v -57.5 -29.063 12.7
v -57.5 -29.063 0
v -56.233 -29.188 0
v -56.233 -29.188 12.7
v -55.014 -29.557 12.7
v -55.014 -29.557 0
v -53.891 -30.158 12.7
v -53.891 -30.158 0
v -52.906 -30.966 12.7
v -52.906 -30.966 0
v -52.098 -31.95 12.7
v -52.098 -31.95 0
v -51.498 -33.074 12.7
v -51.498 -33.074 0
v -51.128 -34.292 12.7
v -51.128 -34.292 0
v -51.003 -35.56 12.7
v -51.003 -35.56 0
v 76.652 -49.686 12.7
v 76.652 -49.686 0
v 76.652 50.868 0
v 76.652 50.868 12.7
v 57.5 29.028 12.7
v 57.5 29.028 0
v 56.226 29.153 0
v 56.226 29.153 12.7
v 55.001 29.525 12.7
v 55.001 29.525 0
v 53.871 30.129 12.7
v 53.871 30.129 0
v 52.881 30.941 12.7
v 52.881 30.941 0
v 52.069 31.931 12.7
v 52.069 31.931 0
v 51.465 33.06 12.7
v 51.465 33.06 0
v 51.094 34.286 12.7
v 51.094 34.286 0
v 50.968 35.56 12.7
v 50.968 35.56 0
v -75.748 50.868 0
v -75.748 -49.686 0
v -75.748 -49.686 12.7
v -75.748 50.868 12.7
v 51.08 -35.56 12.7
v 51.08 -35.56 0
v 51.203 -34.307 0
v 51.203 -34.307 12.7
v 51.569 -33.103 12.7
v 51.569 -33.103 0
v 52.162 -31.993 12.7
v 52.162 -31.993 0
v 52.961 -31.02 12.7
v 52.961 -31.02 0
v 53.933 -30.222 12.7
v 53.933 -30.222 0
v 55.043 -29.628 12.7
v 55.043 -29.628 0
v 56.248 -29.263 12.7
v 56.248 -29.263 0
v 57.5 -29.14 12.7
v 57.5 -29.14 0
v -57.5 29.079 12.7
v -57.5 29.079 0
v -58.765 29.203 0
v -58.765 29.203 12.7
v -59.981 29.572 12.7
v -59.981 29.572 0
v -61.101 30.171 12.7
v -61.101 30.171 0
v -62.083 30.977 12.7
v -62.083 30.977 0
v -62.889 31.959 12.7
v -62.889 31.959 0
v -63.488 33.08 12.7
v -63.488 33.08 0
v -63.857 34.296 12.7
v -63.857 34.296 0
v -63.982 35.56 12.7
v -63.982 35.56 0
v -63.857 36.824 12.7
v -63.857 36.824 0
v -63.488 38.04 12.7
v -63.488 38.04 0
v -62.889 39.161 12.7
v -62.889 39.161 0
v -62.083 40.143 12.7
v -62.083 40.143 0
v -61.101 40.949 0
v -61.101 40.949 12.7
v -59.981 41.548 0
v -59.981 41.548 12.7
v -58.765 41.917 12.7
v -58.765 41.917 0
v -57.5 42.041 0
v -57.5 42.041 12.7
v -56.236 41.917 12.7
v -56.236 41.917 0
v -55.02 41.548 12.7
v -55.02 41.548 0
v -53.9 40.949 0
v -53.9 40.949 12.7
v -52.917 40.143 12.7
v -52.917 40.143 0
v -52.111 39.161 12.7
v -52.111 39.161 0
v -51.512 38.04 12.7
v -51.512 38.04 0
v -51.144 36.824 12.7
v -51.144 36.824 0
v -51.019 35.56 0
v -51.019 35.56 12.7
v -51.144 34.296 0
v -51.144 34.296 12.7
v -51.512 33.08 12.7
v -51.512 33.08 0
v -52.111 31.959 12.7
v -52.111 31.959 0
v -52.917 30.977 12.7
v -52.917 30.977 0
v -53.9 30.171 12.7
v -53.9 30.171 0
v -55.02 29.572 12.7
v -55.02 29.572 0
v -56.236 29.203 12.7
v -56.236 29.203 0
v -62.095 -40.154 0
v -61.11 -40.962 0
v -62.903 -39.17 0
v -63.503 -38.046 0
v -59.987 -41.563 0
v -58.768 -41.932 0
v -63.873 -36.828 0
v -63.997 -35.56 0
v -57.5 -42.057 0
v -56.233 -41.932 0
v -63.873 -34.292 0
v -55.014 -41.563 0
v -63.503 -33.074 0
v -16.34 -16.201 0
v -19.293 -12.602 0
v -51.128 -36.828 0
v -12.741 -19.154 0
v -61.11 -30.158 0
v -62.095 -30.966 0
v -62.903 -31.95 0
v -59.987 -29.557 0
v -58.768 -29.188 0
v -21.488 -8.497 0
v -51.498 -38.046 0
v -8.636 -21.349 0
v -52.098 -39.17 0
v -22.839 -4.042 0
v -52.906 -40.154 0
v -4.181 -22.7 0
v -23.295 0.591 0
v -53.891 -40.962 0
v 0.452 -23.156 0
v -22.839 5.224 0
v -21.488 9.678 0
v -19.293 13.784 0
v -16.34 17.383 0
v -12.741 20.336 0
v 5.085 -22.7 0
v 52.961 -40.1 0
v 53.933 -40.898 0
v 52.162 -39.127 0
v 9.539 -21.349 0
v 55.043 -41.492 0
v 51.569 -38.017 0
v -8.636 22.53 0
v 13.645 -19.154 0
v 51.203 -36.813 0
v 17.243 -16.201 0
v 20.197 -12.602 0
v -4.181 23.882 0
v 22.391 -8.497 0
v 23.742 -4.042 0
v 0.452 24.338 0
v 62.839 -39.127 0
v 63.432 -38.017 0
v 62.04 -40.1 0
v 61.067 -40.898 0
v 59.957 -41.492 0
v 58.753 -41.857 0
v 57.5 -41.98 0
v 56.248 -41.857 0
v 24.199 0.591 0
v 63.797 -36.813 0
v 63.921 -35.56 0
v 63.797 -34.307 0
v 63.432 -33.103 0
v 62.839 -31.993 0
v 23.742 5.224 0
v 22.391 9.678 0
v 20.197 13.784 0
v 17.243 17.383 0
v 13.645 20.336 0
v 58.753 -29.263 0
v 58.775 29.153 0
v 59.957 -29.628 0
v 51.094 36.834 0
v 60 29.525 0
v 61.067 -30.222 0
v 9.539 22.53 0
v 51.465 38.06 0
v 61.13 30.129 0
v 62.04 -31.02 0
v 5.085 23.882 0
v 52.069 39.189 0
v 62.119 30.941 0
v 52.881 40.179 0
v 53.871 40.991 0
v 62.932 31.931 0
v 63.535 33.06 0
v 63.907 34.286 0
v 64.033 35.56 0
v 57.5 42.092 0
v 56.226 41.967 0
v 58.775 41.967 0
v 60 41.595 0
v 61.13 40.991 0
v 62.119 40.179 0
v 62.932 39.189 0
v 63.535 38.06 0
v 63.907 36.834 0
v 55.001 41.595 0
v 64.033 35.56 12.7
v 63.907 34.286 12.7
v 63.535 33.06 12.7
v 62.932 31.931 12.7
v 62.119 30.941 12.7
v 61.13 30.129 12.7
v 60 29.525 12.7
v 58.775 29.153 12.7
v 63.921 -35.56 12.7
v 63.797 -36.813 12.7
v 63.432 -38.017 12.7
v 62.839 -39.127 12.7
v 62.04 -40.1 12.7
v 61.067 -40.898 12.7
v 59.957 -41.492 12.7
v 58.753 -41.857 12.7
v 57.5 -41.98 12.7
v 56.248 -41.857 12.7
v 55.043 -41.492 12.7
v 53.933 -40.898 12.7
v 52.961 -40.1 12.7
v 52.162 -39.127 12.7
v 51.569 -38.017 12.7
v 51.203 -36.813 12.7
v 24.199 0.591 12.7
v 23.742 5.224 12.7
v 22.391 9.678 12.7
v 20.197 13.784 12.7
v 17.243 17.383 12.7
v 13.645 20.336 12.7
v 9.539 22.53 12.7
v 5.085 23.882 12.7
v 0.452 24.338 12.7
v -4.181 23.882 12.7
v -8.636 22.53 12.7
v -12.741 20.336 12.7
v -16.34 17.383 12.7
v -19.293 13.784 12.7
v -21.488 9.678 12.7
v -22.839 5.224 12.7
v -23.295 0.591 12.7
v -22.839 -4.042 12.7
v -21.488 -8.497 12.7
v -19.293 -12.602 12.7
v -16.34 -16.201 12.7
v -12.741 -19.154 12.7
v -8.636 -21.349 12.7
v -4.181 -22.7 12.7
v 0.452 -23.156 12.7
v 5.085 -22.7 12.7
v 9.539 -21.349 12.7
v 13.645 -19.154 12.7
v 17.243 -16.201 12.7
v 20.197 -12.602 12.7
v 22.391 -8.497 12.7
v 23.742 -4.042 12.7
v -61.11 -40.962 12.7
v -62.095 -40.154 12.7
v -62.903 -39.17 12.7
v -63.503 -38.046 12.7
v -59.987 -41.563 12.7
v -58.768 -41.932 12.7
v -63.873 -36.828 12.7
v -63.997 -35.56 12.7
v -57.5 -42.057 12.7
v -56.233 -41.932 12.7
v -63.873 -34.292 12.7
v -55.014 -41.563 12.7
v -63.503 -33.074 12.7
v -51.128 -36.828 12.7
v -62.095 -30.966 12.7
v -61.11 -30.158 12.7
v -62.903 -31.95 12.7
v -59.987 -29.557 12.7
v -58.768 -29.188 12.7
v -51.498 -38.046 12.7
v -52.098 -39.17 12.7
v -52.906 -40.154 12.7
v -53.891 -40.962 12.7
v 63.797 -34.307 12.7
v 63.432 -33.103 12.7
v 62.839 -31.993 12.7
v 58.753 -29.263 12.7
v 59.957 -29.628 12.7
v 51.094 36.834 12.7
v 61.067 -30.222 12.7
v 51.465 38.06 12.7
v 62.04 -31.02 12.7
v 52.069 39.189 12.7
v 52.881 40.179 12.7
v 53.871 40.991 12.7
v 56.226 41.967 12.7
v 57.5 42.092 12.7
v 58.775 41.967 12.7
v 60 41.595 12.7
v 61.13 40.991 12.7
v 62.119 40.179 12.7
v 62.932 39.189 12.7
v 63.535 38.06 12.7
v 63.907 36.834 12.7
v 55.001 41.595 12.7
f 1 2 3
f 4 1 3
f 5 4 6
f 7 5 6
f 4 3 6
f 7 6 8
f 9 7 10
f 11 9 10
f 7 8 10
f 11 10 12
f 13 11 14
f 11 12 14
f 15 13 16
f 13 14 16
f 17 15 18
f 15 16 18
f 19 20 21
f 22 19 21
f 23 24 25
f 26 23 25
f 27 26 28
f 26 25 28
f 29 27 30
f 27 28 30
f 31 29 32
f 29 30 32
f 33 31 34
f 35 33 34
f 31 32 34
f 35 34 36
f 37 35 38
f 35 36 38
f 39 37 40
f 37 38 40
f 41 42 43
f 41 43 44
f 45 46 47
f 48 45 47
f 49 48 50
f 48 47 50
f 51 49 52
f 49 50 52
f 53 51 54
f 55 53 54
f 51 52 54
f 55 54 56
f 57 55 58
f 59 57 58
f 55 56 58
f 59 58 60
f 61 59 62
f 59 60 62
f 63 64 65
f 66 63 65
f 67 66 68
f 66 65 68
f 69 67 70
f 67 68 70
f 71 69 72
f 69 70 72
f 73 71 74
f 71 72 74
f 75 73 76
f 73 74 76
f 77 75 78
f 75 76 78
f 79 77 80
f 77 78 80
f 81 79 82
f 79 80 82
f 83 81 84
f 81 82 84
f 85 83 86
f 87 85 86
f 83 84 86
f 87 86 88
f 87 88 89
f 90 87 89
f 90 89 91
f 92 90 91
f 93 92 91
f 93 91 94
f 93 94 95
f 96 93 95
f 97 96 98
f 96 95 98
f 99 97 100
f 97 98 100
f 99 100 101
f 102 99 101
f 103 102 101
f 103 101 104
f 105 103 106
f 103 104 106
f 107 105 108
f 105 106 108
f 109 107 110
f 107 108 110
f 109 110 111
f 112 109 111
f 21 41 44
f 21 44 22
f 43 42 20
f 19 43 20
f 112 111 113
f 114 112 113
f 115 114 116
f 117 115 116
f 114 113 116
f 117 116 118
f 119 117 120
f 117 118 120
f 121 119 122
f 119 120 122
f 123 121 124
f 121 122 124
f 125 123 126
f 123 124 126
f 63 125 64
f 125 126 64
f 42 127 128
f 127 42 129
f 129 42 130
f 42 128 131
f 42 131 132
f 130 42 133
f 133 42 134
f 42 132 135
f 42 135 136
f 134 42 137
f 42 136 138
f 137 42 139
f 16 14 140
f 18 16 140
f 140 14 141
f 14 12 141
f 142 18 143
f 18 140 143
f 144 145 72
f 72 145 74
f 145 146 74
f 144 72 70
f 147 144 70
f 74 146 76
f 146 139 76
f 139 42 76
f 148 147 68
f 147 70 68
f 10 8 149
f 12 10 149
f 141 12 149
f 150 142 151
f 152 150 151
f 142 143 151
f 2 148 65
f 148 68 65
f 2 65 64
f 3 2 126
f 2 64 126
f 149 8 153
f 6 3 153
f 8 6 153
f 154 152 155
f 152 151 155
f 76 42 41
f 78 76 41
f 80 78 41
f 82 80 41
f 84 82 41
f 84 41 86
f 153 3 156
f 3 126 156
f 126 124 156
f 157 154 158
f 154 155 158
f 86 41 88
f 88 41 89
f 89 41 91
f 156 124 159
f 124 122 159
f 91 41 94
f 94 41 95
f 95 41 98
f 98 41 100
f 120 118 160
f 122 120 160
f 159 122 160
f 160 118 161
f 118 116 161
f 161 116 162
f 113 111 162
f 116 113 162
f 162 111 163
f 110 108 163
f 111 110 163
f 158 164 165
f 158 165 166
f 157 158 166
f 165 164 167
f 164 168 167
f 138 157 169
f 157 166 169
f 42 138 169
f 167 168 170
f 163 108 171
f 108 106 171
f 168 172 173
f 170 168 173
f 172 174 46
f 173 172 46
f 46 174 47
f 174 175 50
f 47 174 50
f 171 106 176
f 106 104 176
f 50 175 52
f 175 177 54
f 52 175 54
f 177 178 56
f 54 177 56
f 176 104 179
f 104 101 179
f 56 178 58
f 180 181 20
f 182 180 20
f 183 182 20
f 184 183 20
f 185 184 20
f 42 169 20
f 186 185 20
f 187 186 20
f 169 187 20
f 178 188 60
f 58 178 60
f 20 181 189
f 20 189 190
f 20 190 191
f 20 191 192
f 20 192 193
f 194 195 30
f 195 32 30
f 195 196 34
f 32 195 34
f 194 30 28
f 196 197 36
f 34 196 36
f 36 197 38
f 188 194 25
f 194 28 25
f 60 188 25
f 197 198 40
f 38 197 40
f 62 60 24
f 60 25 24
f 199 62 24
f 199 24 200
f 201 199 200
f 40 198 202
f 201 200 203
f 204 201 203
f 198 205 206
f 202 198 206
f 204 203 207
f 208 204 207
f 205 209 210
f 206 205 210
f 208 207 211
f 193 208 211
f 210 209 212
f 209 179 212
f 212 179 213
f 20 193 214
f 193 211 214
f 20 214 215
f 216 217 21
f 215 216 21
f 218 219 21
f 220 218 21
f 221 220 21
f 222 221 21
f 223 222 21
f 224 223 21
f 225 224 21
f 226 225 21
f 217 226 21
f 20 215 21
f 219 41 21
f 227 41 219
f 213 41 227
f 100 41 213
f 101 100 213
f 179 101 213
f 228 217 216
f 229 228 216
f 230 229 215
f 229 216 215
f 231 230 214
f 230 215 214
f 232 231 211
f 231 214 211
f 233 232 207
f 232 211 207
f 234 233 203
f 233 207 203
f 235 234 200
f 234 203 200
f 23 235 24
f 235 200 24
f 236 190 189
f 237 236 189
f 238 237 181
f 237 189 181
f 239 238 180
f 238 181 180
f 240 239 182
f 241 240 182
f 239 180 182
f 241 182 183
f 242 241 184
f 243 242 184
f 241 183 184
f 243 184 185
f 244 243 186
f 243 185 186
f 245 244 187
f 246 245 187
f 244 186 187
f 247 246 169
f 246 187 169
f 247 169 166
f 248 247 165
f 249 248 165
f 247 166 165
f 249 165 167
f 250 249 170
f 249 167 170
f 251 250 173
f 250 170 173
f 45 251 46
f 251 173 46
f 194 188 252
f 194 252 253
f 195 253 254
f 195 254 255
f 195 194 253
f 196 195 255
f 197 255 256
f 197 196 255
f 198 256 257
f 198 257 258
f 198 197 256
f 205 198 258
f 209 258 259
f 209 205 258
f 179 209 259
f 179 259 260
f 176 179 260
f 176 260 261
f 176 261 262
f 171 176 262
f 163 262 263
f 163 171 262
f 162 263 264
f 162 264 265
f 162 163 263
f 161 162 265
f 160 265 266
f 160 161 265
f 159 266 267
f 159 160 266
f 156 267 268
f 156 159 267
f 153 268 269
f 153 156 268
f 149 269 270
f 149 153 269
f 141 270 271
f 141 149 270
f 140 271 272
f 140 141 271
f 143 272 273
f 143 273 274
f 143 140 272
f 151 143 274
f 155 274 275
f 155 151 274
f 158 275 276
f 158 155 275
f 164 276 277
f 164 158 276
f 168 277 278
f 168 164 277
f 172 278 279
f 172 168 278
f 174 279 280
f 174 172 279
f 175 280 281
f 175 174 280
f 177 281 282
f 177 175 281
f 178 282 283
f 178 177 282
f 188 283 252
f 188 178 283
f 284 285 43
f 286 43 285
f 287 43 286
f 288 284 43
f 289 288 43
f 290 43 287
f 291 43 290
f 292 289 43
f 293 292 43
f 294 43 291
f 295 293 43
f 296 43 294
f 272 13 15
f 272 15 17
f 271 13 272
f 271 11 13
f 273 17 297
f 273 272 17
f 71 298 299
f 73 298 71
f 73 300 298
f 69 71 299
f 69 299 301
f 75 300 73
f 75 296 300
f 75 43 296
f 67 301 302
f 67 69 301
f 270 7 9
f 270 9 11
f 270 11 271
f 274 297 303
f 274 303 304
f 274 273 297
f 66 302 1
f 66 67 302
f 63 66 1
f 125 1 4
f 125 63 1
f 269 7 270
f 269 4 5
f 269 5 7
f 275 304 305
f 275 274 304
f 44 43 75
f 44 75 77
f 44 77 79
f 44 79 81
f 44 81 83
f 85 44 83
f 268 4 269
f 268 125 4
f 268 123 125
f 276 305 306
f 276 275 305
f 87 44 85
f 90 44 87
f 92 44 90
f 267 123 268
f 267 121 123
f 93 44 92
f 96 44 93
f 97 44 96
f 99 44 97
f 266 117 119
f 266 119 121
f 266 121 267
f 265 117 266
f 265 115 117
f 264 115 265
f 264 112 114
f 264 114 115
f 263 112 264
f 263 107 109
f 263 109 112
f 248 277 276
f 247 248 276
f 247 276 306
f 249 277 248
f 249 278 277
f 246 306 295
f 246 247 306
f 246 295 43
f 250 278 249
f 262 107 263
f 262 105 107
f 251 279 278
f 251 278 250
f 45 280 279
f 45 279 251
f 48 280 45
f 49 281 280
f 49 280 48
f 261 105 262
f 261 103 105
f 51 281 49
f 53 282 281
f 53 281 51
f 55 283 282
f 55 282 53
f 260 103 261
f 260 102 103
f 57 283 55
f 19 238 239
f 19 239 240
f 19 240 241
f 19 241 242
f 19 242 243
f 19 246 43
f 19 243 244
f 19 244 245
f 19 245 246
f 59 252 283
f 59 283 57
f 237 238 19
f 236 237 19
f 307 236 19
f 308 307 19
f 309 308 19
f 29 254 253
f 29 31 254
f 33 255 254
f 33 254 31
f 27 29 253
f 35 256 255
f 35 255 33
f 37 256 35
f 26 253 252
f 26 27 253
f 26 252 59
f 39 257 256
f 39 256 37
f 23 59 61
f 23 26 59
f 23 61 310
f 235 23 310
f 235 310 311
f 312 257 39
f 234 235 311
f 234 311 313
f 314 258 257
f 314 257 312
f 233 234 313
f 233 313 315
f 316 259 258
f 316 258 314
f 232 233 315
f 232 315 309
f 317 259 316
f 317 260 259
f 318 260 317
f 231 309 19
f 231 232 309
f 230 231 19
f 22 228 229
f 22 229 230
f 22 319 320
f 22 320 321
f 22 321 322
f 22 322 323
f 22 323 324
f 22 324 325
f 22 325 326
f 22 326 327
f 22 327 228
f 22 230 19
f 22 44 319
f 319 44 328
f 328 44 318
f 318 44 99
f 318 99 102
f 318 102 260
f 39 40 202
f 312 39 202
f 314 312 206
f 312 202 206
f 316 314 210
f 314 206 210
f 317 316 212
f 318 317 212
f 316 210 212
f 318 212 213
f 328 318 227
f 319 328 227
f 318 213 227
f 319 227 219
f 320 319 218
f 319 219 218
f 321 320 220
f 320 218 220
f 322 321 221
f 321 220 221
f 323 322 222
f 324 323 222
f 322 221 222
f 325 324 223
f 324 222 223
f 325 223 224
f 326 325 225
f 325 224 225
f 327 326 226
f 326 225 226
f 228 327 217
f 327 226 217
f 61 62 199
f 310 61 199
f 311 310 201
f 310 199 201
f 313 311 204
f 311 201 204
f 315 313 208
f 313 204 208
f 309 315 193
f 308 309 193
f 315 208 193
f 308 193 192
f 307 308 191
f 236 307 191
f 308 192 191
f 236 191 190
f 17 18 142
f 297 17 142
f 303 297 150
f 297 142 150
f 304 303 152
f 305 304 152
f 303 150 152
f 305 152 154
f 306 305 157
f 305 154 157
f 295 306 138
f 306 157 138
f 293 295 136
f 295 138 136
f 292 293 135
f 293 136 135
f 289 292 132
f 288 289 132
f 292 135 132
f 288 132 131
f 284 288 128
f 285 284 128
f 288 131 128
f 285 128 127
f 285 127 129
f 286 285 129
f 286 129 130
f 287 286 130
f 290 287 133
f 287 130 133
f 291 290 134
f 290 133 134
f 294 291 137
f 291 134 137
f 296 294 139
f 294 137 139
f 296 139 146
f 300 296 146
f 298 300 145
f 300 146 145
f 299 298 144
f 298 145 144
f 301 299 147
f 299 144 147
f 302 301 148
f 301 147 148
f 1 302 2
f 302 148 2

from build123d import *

# Parameters (mm, degrees)
F0_W     = 152.4
F0_H     = 100.554315
F0_R     = 23.747054
F1_DEPTH = 12.7


with BuildPart() as f1:
    # F0 (on Top) → F1 (new body)
    with BuildSketch(Plane.XY):
        with Locations((0.451705, 0.590802)):
            Rectangle(F0_W, F0_H)
        with BuildLine():
            ThreePointArc((-57.500403, 29.078691), (-62.083381, 40.142978), (-51.019094, 35.56))
            Line((-51.019094, 35.56), (50.968102, 35.56))
            ThreePointArc((50.968102, 35.56), (57.500403, 42.092301), (64.032704, 35.56))
            ThreePointArc((64.032704, 35.56), (62.119438, 30.940966), (57.500403, 29.027699))
            Line((57.500403, 29.027699), (57.500403, -29.139609))
            ThreePointArc((57.500403, -29.139609), (62.040305, -31.020098), (63.920794, -35.56))
            ThreePointArc((63.920794, -35.56), (57.500403, -41.980391), (51.080013, -35.56))
            Line((51.080013, -35.56), (-51.003335, -35.56))
            ThreePointArc((-51.003335, -35.56), (-62.094525, -40.154121), (-57.500403, -29.062932))
            Line((-57.500403, -29.062932), (-57.500403, 29.078691))
        make_face(mode=Mode.SUBTRACT)
        with BuildLine():
            Line((50.968102, 35.56), (-51.019094, 35.56))
            ThreePointArc((-51.019094, 35.56), (-52.917426, 30.977022), (-57.500403, 29.078691))
            Line((-57.500403, 29.078691), (-57.500403, -29.062932))
            ThreePointArc((-57.500403, -29.062932), (-52.906282, -30.965879), (-51.003335, -35.56))
            Line((-51.003335, -35.56), (51.080013, -35.56))
            ThreePointArc((51.080013, -35.56), (52.960502, -31.020098), (57.500403, -29.139609))
            Line((57.500403, -29.139609), (57.500403, 29.027699))
            ThreePointArc((57.500403, 29.027699), (52.881369, 30.940966), (50.968102, 35.56))
        make_face()
        with Locations((0.451705, 0.590802)):
            Circle(F0_R, mode=Mode.SUBTRACT)
    extrude(amount=F1_DEPTH)


solid = f1.part
